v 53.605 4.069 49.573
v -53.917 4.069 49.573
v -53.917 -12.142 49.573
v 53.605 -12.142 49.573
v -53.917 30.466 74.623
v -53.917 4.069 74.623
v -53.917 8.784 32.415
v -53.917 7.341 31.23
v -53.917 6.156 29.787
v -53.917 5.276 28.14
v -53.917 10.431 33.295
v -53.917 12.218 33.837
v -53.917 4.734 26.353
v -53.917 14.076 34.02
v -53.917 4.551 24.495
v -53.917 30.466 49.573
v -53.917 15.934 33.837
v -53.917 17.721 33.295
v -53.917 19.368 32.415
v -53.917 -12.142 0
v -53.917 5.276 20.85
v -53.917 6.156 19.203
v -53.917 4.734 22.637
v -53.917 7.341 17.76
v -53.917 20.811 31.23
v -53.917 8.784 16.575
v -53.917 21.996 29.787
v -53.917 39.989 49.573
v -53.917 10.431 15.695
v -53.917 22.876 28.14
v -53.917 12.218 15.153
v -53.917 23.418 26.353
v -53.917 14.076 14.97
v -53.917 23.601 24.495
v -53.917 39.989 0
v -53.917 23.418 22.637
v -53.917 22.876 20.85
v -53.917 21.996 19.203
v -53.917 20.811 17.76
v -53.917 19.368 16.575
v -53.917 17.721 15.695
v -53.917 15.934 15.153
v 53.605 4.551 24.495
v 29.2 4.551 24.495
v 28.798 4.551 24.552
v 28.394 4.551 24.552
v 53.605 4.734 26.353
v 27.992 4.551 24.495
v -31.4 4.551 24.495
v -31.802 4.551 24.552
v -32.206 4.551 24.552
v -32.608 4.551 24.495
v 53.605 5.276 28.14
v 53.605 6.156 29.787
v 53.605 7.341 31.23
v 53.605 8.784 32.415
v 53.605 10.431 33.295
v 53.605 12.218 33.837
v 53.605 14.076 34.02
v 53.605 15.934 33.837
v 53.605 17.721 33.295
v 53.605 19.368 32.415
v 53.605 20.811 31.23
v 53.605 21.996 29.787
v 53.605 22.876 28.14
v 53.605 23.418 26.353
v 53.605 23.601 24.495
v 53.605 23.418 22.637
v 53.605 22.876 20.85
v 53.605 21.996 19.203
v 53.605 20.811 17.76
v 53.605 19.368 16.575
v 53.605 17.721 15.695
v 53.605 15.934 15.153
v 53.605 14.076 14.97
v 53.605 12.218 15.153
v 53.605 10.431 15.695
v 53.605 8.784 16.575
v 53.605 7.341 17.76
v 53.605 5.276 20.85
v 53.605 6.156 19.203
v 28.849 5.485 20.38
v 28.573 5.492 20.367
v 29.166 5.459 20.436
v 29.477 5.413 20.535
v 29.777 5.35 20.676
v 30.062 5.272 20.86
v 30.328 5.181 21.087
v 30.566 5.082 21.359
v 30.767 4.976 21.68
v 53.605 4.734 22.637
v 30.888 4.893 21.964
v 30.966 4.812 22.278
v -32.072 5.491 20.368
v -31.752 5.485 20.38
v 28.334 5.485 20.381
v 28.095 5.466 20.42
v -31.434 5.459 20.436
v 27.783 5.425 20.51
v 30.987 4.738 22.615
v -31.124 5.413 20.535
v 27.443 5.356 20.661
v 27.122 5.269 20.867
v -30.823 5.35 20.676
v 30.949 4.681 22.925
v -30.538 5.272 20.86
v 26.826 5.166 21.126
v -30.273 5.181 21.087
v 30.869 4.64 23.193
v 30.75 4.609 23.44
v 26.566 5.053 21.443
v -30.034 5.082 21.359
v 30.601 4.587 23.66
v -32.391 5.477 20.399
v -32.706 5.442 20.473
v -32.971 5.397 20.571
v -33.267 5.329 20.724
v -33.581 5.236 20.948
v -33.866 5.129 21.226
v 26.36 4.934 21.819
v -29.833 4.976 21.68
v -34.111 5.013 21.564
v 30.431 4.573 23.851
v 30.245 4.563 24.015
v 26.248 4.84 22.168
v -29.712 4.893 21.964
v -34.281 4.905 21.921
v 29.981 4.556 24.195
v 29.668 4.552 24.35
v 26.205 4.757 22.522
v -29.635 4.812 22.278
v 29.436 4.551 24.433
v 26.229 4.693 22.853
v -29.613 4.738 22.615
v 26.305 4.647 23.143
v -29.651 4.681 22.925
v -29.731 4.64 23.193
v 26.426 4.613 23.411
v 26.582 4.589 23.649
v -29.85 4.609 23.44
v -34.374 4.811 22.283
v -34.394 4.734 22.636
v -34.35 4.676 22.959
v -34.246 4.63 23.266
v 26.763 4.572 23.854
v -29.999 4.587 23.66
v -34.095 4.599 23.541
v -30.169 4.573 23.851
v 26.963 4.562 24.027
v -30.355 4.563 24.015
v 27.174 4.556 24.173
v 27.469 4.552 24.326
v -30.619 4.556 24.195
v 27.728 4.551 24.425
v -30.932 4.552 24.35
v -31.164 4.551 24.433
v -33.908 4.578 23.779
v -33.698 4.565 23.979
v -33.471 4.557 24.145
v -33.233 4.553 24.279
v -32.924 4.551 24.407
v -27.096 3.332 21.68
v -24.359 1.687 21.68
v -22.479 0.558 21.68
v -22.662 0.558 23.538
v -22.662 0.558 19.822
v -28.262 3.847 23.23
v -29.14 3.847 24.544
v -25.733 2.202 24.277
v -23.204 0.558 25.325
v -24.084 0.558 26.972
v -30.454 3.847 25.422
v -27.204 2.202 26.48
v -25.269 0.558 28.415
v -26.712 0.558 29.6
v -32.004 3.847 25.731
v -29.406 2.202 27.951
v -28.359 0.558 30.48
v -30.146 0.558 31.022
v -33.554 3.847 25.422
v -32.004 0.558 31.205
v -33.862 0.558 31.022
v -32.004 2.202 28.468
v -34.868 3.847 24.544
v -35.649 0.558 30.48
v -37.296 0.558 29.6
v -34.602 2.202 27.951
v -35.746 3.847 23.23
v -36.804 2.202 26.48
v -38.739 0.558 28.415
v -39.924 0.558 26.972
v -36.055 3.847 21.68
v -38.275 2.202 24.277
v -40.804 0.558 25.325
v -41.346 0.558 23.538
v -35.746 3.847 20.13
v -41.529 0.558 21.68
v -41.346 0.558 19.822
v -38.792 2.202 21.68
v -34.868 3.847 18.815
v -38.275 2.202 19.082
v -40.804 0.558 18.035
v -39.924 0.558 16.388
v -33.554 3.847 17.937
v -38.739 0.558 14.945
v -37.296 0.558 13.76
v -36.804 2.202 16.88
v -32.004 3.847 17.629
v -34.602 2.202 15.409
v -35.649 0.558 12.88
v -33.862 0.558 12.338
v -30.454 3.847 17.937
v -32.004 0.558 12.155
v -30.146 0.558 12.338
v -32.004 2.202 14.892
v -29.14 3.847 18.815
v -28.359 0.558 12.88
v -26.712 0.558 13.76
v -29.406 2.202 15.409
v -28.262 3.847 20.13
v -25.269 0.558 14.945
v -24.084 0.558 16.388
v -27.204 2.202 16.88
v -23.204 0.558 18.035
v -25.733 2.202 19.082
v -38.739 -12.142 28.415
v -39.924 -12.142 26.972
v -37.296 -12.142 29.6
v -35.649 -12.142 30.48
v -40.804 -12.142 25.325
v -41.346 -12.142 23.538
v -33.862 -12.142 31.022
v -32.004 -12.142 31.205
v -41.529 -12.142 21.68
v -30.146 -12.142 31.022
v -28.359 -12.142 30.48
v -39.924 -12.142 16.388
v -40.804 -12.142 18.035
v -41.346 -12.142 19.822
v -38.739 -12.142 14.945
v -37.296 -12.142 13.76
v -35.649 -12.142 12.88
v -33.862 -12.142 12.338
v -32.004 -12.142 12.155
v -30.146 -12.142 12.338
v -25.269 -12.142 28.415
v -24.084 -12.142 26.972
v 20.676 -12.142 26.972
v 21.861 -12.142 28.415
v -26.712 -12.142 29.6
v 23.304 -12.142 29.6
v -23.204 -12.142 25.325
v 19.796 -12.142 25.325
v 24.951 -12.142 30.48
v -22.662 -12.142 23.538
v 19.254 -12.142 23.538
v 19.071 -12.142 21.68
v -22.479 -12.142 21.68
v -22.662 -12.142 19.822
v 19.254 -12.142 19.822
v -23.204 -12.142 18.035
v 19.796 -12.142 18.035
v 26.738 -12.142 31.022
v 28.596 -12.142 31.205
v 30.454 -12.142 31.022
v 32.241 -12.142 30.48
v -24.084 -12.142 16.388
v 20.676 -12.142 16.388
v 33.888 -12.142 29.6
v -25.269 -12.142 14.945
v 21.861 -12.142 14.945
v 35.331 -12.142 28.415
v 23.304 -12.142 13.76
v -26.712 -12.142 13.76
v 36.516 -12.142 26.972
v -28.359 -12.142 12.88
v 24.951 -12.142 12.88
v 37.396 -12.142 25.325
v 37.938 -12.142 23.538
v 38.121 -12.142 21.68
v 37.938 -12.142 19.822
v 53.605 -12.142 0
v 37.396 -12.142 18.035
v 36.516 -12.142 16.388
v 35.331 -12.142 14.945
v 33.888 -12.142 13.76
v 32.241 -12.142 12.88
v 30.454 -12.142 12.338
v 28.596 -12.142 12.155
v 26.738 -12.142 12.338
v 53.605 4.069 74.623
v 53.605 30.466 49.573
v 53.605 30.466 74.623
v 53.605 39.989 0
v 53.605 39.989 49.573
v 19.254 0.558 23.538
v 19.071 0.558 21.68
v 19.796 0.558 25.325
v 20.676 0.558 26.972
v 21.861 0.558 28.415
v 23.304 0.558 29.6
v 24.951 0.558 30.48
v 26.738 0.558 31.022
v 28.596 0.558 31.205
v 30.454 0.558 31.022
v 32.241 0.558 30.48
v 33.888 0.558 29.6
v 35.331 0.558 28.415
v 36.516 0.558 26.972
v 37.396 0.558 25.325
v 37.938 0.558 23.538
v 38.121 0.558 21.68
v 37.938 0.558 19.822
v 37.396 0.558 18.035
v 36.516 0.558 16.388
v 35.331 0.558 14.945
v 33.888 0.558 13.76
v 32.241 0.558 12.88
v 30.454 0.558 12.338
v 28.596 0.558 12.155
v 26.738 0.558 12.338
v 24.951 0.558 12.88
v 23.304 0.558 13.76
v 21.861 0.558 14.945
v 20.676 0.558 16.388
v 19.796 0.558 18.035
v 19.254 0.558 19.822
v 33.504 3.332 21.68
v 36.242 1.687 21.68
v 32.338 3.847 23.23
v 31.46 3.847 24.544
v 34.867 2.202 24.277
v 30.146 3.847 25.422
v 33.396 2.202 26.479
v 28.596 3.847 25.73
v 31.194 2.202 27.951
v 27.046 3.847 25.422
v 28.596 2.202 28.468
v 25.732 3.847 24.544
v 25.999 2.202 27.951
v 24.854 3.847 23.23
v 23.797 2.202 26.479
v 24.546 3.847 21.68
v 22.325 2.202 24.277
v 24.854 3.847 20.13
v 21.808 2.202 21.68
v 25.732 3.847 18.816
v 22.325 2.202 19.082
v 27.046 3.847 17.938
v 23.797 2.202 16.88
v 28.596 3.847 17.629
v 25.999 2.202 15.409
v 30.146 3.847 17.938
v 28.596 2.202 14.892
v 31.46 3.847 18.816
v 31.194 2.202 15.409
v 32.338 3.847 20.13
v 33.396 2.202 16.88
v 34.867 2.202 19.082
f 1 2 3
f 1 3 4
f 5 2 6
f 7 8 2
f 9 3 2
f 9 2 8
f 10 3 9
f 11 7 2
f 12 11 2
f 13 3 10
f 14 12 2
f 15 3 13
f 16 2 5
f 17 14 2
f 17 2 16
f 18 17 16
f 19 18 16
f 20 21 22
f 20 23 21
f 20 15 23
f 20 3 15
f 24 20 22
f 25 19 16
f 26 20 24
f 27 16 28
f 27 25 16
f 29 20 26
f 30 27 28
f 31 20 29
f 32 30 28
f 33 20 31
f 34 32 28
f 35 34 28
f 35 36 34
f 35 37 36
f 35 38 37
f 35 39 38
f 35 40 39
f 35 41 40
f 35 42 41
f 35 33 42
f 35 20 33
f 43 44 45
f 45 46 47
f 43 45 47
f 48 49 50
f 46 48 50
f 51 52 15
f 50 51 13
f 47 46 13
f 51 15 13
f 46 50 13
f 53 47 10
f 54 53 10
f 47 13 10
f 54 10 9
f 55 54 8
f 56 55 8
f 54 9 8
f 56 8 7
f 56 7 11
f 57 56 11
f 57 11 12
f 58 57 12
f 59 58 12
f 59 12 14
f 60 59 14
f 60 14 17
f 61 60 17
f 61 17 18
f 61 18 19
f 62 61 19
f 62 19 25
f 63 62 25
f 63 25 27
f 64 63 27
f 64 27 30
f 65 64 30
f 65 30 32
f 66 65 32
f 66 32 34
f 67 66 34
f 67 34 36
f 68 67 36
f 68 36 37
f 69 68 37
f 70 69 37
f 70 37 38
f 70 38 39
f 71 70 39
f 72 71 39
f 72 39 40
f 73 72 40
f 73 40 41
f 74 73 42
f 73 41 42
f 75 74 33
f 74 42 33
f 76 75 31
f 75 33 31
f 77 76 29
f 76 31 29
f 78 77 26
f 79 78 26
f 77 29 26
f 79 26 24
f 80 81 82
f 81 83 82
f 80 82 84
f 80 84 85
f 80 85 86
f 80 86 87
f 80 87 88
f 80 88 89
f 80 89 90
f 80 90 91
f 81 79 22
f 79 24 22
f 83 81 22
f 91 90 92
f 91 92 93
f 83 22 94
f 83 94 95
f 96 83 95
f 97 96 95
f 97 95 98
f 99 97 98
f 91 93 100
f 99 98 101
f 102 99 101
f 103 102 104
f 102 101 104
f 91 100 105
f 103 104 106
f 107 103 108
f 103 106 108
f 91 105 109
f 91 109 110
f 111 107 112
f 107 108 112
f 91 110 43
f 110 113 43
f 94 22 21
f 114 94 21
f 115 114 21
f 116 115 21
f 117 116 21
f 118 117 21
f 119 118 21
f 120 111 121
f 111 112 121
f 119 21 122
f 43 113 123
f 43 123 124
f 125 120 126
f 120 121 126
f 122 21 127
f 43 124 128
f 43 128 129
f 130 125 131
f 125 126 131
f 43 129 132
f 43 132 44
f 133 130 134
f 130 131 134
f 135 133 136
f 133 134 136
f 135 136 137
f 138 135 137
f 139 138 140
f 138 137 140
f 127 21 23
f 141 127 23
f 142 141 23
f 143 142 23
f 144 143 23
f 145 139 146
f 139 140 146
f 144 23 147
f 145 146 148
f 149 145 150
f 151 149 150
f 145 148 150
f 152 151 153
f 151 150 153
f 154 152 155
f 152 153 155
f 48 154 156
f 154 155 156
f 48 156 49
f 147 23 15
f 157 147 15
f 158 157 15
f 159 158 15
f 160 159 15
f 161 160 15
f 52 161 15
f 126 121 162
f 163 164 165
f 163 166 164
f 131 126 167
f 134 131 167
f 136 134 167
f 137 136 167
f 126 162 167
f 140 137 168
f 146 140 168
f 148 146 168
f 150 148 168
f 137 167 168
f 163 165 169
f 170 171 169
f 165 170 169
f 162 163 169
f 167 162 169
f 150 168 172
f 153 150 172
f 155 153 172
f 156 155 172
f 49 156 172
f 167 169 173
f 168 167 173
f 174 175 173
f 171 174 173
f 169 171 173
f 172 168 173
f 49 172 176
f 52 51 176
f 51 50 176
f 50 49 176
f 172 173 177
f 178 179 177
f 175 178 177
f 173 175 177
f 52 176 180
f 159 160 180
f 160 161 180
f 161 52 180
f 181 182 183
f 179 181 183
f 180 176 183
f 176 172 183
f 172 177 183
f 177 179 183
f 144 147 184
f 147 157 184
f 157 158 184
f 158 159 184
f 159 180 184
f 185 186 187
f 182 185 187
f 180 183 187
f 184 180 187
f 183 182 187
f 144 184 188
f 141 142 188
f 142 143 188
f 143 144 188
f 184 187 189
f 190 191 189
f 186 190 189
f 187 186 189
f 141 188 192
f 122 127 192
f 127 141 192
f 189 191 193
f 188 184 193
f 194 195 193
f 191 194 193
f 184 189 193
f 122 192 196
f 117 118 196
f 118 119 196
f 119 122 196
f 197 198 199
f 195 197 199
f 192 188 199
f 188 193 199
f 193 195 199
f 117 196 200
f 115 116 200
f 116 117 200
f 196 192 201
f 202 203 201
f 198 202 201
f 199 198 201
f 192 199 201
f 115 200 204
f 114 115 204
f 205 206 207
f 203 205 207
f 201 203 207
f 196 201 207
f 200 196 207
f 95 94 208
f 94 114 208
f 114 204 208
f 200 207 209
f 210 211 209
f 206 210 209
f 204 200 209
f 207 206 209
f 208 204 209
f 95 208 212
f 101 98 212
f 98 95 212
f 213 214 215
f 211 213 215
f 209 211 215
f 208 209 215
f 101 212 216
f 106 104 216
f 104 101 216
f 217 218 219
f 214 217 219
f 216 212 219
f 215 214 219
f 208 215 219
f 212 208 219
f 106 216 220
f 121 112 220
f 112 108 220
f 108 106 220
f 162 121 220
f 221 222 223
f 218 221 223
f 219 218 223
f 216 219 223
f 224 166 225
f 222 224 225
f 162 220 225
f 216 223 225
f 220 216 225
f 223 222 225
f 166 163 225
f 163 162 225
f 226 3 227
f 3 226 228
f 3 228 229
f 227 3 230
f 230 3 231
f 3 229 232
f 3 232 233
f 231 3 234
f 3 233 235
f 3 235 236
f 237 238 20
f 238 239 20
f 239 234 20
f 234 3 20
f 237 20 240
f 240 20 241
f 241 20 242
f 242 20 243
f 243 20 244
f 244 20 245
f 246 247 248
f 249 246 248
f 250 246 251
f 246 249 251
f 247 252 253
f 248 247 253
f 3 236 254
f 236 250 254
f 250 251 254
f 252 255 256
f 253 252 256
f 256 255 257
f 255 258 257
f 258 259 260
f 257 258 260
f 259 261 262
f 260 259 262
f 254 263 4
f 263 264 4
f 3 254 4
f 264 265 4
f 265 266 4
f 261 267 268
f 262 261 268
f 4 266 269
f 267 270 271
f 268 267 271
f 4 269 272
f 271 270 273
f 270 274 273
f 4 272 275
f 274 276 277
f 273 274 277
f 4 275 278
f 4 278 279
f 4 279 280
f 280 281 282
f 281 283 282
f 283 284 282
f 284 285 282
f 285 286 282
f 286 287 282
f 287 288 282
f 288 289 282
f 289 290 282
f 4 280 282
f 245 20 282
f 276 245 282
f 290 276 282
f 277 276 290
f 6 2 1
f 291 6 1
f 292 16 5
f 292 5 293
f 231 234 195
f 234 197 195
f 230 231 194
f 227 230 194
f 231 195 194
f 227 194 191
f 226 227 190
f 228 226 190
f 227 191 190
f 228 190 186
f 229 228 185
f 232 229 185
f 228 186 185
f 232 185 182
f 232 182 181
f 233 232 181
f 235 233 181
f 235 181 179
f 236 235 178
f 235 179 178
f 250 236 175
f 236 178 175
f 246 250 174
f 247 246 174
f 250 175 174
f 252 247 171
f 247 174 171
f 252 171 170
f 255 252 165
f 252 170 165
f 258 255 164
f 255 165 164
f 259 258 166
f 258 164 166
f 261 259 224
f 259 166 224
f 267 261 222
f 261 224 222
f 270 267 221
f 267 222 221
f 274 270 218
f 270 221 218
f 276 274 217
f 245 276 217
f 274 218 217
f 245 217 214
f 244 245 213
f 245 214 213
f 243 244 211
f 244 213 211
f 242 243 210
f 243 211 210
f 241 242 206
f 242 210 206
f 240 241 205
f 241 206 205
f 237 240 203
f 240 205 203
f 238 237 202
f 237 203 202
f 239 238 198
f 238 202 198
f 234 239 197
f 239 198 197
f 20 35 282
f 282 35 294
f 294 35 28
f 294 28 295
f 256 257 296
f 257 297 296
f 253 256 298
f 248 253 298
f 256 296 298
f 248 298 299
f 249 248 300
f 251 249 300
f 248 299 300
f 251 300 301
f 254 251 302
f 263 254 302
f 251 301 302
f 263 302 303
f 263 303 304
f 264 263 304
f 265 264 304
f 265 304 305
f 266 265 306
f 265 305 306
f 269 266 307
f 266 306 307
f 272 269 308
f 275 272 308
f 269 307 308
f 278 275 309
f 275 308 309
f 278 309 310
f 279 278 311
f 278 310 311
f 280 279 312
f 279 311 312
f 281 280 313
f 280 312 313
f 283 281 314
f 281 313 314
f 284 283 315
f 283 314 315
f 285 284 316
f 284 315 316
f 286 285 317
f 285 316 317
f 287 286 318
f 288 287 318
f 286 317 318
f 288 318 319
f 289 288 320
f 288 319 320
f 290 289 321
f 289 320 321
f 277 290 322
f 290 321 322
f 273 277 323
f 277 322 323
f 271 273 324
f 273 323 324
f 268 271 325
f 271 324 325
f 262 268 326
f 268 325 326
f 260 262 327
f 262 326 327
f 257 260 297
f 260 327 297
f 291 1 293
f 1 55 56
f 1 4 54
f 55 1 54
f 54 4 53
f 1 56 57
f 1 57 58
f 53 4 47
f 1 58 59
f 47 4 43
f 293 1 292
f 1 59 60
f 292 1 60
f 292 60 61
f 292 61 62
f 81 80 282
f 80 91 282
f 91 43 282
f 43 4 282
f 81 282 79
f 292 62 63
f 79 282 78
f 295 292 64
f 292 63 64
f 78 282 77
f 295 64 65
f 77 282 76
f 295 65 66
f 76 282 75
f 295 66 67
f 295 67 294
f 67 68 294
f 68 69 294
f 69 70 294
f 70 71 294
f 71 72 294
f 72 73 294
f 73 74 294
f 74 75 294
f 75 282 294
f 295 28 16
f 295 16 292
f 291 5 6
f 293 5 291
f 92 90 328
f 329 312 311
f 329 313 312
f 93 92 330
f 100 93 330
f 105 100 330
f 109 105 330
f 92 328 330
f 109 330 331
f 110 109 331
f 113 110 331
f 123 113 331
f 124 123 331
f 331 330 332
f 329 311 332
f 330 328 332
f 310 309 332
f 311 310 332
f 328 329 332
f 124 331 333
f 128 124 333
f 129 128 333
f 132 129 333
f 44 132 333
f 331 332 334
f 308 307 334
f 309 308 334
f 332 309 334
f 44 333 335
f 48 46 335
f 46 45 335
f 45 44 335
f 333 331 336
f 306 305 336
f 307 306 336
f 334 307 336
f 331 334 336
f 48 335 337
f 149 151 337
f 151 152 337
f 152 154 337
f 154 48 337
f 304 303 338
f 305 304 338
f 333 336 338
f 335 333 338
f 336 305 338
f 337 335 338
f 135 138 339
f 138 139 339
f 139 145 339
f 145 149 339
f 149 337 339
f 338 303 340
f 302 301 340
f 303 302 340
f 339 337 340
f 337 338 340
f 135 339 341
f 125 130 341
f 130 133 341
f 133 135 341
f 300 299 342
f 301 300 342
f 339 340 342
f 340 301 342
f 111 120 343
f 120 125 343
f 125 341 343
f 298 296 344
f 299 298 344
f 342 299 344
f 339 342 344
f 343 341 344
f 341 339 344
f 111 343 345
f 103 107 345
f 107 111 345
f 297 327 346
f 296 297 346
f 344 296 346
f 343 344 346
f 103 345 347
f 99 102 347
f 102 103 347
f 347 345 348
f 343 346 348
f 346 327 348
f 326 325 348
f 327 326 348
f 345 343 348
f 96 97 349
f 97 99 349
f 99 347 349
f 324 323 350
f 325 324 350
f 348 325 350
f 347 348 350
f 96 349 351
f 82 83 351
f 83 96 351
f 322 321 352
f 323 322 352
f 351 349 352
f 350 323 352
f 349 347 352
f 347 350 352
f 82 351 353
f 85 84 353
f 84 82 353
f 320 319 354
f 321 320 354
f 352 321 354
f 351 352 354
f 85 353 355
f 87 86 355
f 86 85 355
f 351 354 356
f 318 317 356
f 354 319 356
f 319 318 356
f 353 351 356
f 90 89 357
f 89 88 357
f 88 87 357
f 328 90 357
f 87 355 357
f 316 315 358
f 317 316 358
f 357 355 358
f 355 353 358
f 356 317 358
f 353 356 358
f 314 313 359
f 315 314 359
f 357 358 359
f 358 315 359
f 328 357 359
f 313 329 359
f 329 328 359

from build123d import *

# Parameters (mm, degrees)
F0_W     = 107.5221002102
F0_H     = 52.1313343197
F1_DEPTH = 49.57312
F2_W     = 107.5221002102
F2_H     = 26.3976580463
F3_DEPTH = 25.04967
F6_D     = 19.05
F7_D     = 19.05
F7_DEPTH = 12.7
F7_TIP   = 5.7231973962


with BuildPart() as f1:
    # F0 (on Top) → F1 (new body)
    with BuildSketch(Plane.XY):
        with Locations((-0.1560784876, 13.9232939109)):
            Rectangle(F0_W, F0_H)
    extrude(amount=F1_DEPTH)

    # F2 (on face) → F3 (join)
    with BuildSketch(Plane.XY.offset(49.57312)):
        with Locations((-0.1560784876, 17.2676101793)):
            Rectangle(F2_W, F2_H)
    extrude(amount=F3_DEPTH)

    # F6 (through all)
    with Locations(Plane.YZ.offset(53.6049716175)):
        with Locations((14.0758333728, 24.4949776679)):
            Hole(F6_D / 2)

    # F7
    with Locations(Plane.XZ.offset(12.1423732489)):
        with Locations((-32.0040024817, 21.6798111796), (28.5961665213, 21.6798111796)):
            Hole(F7_D / 2, depth=F7_DEPTH)
            with Locations((0, 0, -(F7_DEPTH + F7_TIP / 2))):  # 118° drill point
                Cone(0, F7_D / 2, F7_TIP, mode=Mode.SUBTRACT)


solid = f1.part
